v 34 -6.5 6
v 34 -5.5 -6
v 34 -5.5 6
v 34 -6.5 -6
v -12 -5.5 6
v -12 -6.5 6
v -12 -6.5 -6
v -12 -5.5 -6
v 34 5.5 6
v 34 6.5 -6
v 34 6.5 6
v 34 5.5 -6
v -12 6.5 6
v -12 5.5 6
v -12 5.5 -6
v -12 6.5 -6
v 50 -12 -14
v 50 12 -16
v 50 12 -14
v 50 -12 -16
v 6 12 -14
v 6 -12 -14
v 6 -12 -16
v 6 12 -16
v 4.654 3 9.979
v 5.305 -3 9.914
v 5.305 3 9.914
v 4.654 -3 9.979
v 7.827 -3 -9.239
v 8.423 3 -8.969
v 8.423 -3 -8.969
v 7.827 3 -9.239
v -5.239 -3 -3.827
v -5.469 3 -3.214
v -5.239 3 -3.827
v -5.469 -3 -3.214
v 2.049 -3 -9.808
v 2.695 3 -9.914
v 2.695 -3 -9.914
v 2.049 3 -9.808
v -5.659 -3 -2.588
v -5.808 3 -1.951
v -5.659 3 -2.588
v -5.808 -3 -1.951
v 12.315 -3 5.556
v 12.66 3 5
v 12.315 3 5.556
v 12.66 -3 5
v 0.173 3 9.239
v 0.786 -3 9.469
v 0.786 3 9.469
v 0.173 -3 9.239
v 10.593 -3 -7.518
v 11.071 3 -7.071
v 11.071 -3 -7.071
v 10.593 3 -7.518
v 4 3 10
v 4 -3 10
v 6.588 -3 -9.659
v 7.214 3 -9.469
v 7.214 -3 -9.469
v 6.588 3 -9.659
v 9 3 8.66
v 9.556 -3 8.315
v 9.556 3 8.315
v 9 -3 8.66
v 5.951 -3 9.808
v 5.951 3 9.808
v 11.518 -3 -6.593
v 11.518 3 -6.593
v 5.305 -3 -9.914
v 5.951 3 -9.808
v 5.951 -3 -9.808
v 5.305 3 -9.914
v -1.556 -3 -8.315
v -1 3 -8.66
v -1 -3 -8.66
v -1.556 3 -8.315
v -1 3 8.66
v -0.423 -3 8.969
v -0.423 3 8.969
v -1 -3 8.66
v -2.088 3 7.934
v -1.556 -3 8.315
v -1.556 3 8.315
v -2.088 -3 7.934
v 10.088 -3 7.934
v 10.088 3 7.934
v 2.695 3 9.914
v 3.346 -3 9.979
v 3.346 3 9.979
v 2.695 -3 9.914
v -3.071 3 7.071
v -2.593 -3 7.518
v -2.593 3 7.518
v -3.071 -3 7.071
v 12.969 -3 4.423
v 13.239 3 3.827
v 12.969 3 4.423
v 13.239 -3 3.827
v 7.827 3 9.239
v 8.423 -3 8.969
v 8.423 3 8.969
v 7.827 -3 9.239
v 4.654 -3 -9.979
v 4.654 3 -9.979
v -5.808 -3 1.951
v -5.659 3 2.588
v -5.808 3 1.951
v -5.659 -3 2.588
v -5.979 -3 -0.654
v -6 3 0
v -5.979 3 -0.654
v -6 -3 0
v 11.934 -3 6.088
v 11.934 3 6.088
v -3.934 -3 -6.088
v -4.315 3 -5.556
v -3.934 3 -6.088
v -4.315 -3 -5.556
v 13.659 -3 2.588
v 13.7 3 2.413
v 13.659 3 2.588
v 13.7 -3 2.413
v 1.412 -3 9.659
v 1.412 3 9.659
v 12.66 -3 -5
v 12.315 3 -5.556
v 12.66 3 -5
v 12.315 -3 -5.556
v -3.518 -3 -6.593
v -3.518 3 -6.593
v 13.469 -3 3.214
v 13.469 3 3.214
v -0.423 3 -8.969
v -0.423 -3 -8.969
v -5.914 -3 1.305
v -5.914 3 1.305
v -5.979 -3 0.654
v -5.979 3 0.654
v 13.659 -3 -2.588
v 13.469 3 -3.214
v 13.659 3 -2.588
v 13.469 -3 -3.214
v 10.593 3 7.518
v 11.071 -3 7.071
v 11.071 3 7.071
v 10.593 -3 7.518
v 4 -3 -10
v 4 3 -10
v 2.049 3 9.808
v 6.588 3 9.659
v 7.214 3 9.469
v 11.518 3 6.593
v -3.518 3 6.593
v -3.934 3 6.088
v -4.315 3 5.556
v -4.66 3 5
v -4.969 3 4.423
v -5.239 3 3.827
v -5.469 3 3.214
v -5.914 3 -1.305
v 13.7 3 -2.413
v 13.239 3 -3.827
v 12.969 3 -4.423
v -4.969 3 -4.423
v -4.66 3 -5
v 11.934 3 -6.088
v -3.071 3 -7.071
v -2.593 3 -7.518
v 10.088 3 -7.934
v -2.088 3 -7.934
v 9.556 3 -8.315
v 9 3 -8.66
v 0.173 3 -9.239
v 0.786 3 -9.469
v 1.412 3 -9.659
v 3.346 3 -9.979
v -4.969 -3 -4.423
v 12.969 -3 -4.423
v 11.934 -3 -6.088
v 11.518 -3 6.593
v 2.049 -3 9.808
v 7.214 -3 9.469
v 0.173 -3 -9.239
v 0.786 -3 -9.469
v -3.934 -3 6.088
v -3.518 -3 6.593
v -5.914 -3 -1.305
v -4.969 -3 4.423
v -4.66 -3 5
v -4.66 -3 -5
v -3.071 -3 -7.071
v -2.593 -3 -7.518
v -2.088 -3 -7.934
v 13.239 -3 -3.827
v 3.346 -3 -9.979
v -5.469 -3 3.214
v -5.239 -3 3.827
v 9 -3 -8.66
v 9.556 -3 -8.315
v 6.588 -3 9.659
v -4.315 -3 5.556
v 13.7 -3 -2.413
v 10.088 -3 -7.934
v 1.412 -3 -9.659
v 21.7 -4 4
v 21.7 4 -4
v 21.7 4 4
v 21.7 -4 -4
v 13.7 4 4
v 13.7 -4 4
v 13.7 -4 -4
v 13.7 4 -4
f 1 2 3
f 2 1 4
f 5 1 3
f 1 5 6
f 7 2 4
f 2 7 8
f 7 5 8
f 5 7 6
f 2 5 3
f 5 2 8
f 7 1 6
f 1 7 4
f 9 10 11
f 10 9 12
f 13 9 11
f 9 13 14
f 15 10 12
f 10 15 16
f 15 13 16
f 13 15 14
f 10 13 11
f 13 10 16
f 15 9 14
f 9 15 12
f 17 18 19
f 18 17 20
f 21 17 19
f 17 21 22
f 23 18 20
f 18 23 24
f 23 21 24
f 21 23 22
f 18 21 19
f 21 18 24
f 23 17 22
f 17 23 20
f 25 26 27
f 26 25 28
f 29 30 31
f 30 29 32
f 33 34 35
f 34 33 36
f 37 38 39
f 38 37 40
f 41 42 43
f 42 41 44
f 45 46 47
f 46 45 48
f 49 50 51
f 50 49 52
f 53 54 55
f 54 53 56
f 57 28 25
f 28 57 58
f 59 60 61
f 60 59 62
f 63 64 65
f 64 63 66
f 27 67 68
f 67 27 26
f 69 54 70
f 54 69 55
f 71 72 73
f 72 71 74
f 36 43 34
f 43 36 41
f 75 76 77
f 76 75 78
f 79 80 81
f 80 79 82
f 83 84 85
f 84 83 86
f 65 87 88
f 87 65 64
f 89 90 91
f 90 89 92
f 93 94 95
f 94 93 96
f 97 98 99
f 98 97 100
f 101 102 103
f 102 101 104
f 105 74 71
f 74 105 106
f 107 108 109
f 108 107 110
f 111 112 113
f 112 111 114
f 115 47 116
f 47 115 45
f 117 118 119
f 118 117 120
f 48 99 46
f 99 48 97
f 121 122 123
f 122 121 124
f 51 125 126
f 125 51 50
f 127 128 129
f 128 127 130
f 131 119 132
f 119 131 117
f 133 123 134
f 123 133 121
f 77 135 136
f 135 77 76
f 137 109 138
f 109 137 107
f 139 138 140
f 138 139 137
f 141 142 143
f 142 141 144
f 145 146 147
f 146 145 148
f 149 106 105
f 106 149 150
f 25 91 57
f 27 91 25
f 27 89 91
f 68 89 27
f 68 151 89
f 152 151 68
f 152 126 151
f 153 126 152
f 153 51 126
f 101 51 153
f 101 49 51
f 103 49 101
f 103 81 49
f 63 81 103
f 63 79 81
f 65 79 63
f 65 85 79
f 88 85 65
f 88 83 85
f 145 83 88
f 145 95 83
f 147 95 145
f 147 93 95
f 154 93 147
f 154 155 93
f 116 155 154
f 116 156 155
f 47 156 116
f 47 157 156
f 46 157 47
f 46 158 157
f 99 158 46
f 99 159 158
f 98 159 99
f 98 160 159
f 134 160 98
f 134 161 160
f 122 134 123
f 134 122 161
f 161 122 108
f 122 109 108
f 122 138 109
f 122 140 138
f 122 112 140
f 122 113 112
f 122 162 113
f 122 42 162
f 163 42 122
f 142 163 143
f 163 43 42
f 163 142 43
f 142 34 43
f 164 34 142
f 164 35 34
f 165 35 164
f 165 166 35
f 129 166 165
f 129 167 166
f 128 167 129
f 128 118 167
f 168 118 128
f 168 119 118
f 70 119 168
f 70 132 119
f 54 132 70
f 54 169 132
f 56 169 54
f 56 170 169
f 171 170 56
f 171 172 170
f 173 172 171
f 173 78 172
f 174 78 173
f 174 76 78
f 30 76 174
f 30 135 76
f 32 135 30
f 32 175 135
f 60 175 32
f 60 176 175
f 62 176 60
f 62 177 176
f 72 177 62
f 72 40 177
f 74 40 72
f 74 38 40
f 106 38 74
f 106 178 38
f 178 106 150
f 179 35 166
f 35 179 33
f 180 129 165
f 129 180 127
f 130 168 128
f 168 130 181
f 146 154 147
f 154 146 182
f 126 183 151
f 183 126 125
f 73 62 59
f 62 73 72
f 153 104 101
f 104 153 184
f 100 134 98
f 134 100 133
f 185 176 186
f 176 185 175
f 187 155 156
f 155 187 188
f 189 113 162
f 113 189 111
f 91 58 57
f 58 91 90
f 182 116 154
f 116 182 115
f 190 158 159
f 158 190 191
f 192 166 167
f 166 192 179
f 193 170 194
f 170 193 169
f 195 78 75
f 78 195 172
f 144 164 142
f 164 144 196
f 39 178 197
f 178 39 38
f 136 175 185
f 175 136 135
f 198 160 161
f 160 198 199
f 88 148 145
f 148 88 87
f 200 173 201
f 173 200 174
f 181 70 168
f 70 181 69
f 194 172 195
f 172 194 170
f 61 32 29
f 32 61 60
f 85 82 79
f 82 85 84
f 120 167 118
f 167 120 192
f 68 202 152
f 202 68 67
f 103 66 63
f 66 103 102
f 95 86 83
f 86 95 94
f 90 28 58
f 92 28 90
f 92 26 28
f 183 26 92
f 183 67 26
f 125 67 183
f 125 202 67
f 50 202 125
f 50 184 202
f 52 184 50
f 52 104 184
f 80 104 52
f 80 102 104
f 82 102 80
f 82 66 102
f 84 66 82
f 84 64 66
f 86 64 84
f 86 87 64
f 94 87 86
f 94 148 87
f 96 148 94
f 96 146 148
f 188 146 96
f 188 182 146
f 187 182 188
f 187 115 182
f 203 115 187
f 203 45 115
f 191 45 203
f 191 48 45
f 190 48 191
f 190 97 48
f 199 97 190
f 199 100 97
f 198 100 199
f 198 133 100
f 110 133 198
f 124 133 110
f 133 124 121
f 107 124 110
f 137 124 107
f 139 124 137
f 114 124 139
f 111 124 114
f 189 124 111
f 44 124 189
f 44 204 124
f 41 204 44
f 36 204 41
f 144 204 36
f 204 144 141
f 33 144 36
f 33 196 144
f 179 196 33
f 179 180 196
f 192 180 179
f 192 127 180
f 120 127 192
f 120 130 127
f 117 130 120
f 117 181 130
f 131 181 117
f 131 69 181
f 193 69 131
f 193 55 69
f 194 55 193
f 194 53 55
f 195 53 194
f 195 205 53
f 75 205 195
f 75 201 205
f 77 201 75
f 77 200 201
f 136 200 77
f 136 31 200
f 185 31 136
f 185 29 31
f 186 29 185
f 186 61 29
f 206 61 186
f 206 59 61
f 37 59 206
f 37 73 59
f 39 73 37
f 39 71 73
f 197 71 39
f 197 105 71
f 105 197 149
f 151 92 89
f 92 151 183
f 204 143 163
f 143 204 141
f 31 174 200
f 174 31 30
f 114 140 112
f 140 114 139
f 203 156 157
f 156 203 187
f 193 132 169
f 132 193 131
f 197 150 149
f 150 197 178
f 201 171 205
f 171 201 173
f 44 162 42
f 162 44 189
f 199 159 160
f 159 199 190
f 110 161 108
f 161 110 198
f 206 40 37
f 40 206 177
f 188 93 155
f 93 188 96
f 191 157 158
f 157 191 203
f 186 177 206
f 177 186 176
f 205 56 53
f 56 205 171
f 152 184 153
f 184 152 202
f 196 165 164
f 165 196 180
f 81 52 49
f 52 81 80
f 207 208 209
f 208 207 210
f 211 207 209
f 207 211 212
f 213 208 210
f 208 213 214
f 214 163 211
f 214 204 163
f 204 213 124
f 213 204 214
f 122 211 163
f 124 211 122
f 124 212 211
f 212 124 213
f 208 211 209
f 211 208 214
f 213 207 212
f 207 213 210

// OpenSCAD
// Eccentric disk cam with a flat translating follower.
// Two-dimensional mechanism in the XZ plane; the cam rotates about +Y.
// The follower face is perpendicular to +X and moves along X.
cam_angle = 0;
agentscad_part = "all";
eccentricity = 4;
cam_radius = 10;
cam_thickness = 6;
follower_gap = -0.3;
follower_length = 8;
follower_width = 8;
follower_height = 8;
$fn = 96;

module frame_local() {
  // Base plate below the mechanism.
  translate([6, -12, -16]) cube([44, 24, 2]);
  // Two guide rails around the follower; they do not touch the cam.
  for (yy = [-6.5, 5.5]) translate([-12, yy, -6]) cube([46, 1, 12]);
}

module cam_local() {
  // Eccentric disk in the XZ plane; the shaft is omitted so the frame needs no bearing.
  rotate([90, 0, 0]) translate([eccentricity, 0, 0]) cylinder(r = cam_radius, h = cam_thickness, center = true);
}

module follower_local() {
  // Flat face at x = R + e cos(theta) + gap; block extends to +X.
  xpos = cam_radius + eccentricity * cos(cam_angle) + follower_gap;
  translate([xpos, -follower_width / 2, -follower_height / 2])
    cube([follower_length, follower_width, follower_height]);
}

module assembly() {
  if (agentscad_part == "all" || agentscad_part == "frame") frame_local();
  if (agentscad_part == "all" || agentscad_part == "cam") rotate([0, cam_angle, 0]) cam_local();
  if (agentscad_part == "all" || agentscad_part == "follower") follower_local();
}

assembly();
